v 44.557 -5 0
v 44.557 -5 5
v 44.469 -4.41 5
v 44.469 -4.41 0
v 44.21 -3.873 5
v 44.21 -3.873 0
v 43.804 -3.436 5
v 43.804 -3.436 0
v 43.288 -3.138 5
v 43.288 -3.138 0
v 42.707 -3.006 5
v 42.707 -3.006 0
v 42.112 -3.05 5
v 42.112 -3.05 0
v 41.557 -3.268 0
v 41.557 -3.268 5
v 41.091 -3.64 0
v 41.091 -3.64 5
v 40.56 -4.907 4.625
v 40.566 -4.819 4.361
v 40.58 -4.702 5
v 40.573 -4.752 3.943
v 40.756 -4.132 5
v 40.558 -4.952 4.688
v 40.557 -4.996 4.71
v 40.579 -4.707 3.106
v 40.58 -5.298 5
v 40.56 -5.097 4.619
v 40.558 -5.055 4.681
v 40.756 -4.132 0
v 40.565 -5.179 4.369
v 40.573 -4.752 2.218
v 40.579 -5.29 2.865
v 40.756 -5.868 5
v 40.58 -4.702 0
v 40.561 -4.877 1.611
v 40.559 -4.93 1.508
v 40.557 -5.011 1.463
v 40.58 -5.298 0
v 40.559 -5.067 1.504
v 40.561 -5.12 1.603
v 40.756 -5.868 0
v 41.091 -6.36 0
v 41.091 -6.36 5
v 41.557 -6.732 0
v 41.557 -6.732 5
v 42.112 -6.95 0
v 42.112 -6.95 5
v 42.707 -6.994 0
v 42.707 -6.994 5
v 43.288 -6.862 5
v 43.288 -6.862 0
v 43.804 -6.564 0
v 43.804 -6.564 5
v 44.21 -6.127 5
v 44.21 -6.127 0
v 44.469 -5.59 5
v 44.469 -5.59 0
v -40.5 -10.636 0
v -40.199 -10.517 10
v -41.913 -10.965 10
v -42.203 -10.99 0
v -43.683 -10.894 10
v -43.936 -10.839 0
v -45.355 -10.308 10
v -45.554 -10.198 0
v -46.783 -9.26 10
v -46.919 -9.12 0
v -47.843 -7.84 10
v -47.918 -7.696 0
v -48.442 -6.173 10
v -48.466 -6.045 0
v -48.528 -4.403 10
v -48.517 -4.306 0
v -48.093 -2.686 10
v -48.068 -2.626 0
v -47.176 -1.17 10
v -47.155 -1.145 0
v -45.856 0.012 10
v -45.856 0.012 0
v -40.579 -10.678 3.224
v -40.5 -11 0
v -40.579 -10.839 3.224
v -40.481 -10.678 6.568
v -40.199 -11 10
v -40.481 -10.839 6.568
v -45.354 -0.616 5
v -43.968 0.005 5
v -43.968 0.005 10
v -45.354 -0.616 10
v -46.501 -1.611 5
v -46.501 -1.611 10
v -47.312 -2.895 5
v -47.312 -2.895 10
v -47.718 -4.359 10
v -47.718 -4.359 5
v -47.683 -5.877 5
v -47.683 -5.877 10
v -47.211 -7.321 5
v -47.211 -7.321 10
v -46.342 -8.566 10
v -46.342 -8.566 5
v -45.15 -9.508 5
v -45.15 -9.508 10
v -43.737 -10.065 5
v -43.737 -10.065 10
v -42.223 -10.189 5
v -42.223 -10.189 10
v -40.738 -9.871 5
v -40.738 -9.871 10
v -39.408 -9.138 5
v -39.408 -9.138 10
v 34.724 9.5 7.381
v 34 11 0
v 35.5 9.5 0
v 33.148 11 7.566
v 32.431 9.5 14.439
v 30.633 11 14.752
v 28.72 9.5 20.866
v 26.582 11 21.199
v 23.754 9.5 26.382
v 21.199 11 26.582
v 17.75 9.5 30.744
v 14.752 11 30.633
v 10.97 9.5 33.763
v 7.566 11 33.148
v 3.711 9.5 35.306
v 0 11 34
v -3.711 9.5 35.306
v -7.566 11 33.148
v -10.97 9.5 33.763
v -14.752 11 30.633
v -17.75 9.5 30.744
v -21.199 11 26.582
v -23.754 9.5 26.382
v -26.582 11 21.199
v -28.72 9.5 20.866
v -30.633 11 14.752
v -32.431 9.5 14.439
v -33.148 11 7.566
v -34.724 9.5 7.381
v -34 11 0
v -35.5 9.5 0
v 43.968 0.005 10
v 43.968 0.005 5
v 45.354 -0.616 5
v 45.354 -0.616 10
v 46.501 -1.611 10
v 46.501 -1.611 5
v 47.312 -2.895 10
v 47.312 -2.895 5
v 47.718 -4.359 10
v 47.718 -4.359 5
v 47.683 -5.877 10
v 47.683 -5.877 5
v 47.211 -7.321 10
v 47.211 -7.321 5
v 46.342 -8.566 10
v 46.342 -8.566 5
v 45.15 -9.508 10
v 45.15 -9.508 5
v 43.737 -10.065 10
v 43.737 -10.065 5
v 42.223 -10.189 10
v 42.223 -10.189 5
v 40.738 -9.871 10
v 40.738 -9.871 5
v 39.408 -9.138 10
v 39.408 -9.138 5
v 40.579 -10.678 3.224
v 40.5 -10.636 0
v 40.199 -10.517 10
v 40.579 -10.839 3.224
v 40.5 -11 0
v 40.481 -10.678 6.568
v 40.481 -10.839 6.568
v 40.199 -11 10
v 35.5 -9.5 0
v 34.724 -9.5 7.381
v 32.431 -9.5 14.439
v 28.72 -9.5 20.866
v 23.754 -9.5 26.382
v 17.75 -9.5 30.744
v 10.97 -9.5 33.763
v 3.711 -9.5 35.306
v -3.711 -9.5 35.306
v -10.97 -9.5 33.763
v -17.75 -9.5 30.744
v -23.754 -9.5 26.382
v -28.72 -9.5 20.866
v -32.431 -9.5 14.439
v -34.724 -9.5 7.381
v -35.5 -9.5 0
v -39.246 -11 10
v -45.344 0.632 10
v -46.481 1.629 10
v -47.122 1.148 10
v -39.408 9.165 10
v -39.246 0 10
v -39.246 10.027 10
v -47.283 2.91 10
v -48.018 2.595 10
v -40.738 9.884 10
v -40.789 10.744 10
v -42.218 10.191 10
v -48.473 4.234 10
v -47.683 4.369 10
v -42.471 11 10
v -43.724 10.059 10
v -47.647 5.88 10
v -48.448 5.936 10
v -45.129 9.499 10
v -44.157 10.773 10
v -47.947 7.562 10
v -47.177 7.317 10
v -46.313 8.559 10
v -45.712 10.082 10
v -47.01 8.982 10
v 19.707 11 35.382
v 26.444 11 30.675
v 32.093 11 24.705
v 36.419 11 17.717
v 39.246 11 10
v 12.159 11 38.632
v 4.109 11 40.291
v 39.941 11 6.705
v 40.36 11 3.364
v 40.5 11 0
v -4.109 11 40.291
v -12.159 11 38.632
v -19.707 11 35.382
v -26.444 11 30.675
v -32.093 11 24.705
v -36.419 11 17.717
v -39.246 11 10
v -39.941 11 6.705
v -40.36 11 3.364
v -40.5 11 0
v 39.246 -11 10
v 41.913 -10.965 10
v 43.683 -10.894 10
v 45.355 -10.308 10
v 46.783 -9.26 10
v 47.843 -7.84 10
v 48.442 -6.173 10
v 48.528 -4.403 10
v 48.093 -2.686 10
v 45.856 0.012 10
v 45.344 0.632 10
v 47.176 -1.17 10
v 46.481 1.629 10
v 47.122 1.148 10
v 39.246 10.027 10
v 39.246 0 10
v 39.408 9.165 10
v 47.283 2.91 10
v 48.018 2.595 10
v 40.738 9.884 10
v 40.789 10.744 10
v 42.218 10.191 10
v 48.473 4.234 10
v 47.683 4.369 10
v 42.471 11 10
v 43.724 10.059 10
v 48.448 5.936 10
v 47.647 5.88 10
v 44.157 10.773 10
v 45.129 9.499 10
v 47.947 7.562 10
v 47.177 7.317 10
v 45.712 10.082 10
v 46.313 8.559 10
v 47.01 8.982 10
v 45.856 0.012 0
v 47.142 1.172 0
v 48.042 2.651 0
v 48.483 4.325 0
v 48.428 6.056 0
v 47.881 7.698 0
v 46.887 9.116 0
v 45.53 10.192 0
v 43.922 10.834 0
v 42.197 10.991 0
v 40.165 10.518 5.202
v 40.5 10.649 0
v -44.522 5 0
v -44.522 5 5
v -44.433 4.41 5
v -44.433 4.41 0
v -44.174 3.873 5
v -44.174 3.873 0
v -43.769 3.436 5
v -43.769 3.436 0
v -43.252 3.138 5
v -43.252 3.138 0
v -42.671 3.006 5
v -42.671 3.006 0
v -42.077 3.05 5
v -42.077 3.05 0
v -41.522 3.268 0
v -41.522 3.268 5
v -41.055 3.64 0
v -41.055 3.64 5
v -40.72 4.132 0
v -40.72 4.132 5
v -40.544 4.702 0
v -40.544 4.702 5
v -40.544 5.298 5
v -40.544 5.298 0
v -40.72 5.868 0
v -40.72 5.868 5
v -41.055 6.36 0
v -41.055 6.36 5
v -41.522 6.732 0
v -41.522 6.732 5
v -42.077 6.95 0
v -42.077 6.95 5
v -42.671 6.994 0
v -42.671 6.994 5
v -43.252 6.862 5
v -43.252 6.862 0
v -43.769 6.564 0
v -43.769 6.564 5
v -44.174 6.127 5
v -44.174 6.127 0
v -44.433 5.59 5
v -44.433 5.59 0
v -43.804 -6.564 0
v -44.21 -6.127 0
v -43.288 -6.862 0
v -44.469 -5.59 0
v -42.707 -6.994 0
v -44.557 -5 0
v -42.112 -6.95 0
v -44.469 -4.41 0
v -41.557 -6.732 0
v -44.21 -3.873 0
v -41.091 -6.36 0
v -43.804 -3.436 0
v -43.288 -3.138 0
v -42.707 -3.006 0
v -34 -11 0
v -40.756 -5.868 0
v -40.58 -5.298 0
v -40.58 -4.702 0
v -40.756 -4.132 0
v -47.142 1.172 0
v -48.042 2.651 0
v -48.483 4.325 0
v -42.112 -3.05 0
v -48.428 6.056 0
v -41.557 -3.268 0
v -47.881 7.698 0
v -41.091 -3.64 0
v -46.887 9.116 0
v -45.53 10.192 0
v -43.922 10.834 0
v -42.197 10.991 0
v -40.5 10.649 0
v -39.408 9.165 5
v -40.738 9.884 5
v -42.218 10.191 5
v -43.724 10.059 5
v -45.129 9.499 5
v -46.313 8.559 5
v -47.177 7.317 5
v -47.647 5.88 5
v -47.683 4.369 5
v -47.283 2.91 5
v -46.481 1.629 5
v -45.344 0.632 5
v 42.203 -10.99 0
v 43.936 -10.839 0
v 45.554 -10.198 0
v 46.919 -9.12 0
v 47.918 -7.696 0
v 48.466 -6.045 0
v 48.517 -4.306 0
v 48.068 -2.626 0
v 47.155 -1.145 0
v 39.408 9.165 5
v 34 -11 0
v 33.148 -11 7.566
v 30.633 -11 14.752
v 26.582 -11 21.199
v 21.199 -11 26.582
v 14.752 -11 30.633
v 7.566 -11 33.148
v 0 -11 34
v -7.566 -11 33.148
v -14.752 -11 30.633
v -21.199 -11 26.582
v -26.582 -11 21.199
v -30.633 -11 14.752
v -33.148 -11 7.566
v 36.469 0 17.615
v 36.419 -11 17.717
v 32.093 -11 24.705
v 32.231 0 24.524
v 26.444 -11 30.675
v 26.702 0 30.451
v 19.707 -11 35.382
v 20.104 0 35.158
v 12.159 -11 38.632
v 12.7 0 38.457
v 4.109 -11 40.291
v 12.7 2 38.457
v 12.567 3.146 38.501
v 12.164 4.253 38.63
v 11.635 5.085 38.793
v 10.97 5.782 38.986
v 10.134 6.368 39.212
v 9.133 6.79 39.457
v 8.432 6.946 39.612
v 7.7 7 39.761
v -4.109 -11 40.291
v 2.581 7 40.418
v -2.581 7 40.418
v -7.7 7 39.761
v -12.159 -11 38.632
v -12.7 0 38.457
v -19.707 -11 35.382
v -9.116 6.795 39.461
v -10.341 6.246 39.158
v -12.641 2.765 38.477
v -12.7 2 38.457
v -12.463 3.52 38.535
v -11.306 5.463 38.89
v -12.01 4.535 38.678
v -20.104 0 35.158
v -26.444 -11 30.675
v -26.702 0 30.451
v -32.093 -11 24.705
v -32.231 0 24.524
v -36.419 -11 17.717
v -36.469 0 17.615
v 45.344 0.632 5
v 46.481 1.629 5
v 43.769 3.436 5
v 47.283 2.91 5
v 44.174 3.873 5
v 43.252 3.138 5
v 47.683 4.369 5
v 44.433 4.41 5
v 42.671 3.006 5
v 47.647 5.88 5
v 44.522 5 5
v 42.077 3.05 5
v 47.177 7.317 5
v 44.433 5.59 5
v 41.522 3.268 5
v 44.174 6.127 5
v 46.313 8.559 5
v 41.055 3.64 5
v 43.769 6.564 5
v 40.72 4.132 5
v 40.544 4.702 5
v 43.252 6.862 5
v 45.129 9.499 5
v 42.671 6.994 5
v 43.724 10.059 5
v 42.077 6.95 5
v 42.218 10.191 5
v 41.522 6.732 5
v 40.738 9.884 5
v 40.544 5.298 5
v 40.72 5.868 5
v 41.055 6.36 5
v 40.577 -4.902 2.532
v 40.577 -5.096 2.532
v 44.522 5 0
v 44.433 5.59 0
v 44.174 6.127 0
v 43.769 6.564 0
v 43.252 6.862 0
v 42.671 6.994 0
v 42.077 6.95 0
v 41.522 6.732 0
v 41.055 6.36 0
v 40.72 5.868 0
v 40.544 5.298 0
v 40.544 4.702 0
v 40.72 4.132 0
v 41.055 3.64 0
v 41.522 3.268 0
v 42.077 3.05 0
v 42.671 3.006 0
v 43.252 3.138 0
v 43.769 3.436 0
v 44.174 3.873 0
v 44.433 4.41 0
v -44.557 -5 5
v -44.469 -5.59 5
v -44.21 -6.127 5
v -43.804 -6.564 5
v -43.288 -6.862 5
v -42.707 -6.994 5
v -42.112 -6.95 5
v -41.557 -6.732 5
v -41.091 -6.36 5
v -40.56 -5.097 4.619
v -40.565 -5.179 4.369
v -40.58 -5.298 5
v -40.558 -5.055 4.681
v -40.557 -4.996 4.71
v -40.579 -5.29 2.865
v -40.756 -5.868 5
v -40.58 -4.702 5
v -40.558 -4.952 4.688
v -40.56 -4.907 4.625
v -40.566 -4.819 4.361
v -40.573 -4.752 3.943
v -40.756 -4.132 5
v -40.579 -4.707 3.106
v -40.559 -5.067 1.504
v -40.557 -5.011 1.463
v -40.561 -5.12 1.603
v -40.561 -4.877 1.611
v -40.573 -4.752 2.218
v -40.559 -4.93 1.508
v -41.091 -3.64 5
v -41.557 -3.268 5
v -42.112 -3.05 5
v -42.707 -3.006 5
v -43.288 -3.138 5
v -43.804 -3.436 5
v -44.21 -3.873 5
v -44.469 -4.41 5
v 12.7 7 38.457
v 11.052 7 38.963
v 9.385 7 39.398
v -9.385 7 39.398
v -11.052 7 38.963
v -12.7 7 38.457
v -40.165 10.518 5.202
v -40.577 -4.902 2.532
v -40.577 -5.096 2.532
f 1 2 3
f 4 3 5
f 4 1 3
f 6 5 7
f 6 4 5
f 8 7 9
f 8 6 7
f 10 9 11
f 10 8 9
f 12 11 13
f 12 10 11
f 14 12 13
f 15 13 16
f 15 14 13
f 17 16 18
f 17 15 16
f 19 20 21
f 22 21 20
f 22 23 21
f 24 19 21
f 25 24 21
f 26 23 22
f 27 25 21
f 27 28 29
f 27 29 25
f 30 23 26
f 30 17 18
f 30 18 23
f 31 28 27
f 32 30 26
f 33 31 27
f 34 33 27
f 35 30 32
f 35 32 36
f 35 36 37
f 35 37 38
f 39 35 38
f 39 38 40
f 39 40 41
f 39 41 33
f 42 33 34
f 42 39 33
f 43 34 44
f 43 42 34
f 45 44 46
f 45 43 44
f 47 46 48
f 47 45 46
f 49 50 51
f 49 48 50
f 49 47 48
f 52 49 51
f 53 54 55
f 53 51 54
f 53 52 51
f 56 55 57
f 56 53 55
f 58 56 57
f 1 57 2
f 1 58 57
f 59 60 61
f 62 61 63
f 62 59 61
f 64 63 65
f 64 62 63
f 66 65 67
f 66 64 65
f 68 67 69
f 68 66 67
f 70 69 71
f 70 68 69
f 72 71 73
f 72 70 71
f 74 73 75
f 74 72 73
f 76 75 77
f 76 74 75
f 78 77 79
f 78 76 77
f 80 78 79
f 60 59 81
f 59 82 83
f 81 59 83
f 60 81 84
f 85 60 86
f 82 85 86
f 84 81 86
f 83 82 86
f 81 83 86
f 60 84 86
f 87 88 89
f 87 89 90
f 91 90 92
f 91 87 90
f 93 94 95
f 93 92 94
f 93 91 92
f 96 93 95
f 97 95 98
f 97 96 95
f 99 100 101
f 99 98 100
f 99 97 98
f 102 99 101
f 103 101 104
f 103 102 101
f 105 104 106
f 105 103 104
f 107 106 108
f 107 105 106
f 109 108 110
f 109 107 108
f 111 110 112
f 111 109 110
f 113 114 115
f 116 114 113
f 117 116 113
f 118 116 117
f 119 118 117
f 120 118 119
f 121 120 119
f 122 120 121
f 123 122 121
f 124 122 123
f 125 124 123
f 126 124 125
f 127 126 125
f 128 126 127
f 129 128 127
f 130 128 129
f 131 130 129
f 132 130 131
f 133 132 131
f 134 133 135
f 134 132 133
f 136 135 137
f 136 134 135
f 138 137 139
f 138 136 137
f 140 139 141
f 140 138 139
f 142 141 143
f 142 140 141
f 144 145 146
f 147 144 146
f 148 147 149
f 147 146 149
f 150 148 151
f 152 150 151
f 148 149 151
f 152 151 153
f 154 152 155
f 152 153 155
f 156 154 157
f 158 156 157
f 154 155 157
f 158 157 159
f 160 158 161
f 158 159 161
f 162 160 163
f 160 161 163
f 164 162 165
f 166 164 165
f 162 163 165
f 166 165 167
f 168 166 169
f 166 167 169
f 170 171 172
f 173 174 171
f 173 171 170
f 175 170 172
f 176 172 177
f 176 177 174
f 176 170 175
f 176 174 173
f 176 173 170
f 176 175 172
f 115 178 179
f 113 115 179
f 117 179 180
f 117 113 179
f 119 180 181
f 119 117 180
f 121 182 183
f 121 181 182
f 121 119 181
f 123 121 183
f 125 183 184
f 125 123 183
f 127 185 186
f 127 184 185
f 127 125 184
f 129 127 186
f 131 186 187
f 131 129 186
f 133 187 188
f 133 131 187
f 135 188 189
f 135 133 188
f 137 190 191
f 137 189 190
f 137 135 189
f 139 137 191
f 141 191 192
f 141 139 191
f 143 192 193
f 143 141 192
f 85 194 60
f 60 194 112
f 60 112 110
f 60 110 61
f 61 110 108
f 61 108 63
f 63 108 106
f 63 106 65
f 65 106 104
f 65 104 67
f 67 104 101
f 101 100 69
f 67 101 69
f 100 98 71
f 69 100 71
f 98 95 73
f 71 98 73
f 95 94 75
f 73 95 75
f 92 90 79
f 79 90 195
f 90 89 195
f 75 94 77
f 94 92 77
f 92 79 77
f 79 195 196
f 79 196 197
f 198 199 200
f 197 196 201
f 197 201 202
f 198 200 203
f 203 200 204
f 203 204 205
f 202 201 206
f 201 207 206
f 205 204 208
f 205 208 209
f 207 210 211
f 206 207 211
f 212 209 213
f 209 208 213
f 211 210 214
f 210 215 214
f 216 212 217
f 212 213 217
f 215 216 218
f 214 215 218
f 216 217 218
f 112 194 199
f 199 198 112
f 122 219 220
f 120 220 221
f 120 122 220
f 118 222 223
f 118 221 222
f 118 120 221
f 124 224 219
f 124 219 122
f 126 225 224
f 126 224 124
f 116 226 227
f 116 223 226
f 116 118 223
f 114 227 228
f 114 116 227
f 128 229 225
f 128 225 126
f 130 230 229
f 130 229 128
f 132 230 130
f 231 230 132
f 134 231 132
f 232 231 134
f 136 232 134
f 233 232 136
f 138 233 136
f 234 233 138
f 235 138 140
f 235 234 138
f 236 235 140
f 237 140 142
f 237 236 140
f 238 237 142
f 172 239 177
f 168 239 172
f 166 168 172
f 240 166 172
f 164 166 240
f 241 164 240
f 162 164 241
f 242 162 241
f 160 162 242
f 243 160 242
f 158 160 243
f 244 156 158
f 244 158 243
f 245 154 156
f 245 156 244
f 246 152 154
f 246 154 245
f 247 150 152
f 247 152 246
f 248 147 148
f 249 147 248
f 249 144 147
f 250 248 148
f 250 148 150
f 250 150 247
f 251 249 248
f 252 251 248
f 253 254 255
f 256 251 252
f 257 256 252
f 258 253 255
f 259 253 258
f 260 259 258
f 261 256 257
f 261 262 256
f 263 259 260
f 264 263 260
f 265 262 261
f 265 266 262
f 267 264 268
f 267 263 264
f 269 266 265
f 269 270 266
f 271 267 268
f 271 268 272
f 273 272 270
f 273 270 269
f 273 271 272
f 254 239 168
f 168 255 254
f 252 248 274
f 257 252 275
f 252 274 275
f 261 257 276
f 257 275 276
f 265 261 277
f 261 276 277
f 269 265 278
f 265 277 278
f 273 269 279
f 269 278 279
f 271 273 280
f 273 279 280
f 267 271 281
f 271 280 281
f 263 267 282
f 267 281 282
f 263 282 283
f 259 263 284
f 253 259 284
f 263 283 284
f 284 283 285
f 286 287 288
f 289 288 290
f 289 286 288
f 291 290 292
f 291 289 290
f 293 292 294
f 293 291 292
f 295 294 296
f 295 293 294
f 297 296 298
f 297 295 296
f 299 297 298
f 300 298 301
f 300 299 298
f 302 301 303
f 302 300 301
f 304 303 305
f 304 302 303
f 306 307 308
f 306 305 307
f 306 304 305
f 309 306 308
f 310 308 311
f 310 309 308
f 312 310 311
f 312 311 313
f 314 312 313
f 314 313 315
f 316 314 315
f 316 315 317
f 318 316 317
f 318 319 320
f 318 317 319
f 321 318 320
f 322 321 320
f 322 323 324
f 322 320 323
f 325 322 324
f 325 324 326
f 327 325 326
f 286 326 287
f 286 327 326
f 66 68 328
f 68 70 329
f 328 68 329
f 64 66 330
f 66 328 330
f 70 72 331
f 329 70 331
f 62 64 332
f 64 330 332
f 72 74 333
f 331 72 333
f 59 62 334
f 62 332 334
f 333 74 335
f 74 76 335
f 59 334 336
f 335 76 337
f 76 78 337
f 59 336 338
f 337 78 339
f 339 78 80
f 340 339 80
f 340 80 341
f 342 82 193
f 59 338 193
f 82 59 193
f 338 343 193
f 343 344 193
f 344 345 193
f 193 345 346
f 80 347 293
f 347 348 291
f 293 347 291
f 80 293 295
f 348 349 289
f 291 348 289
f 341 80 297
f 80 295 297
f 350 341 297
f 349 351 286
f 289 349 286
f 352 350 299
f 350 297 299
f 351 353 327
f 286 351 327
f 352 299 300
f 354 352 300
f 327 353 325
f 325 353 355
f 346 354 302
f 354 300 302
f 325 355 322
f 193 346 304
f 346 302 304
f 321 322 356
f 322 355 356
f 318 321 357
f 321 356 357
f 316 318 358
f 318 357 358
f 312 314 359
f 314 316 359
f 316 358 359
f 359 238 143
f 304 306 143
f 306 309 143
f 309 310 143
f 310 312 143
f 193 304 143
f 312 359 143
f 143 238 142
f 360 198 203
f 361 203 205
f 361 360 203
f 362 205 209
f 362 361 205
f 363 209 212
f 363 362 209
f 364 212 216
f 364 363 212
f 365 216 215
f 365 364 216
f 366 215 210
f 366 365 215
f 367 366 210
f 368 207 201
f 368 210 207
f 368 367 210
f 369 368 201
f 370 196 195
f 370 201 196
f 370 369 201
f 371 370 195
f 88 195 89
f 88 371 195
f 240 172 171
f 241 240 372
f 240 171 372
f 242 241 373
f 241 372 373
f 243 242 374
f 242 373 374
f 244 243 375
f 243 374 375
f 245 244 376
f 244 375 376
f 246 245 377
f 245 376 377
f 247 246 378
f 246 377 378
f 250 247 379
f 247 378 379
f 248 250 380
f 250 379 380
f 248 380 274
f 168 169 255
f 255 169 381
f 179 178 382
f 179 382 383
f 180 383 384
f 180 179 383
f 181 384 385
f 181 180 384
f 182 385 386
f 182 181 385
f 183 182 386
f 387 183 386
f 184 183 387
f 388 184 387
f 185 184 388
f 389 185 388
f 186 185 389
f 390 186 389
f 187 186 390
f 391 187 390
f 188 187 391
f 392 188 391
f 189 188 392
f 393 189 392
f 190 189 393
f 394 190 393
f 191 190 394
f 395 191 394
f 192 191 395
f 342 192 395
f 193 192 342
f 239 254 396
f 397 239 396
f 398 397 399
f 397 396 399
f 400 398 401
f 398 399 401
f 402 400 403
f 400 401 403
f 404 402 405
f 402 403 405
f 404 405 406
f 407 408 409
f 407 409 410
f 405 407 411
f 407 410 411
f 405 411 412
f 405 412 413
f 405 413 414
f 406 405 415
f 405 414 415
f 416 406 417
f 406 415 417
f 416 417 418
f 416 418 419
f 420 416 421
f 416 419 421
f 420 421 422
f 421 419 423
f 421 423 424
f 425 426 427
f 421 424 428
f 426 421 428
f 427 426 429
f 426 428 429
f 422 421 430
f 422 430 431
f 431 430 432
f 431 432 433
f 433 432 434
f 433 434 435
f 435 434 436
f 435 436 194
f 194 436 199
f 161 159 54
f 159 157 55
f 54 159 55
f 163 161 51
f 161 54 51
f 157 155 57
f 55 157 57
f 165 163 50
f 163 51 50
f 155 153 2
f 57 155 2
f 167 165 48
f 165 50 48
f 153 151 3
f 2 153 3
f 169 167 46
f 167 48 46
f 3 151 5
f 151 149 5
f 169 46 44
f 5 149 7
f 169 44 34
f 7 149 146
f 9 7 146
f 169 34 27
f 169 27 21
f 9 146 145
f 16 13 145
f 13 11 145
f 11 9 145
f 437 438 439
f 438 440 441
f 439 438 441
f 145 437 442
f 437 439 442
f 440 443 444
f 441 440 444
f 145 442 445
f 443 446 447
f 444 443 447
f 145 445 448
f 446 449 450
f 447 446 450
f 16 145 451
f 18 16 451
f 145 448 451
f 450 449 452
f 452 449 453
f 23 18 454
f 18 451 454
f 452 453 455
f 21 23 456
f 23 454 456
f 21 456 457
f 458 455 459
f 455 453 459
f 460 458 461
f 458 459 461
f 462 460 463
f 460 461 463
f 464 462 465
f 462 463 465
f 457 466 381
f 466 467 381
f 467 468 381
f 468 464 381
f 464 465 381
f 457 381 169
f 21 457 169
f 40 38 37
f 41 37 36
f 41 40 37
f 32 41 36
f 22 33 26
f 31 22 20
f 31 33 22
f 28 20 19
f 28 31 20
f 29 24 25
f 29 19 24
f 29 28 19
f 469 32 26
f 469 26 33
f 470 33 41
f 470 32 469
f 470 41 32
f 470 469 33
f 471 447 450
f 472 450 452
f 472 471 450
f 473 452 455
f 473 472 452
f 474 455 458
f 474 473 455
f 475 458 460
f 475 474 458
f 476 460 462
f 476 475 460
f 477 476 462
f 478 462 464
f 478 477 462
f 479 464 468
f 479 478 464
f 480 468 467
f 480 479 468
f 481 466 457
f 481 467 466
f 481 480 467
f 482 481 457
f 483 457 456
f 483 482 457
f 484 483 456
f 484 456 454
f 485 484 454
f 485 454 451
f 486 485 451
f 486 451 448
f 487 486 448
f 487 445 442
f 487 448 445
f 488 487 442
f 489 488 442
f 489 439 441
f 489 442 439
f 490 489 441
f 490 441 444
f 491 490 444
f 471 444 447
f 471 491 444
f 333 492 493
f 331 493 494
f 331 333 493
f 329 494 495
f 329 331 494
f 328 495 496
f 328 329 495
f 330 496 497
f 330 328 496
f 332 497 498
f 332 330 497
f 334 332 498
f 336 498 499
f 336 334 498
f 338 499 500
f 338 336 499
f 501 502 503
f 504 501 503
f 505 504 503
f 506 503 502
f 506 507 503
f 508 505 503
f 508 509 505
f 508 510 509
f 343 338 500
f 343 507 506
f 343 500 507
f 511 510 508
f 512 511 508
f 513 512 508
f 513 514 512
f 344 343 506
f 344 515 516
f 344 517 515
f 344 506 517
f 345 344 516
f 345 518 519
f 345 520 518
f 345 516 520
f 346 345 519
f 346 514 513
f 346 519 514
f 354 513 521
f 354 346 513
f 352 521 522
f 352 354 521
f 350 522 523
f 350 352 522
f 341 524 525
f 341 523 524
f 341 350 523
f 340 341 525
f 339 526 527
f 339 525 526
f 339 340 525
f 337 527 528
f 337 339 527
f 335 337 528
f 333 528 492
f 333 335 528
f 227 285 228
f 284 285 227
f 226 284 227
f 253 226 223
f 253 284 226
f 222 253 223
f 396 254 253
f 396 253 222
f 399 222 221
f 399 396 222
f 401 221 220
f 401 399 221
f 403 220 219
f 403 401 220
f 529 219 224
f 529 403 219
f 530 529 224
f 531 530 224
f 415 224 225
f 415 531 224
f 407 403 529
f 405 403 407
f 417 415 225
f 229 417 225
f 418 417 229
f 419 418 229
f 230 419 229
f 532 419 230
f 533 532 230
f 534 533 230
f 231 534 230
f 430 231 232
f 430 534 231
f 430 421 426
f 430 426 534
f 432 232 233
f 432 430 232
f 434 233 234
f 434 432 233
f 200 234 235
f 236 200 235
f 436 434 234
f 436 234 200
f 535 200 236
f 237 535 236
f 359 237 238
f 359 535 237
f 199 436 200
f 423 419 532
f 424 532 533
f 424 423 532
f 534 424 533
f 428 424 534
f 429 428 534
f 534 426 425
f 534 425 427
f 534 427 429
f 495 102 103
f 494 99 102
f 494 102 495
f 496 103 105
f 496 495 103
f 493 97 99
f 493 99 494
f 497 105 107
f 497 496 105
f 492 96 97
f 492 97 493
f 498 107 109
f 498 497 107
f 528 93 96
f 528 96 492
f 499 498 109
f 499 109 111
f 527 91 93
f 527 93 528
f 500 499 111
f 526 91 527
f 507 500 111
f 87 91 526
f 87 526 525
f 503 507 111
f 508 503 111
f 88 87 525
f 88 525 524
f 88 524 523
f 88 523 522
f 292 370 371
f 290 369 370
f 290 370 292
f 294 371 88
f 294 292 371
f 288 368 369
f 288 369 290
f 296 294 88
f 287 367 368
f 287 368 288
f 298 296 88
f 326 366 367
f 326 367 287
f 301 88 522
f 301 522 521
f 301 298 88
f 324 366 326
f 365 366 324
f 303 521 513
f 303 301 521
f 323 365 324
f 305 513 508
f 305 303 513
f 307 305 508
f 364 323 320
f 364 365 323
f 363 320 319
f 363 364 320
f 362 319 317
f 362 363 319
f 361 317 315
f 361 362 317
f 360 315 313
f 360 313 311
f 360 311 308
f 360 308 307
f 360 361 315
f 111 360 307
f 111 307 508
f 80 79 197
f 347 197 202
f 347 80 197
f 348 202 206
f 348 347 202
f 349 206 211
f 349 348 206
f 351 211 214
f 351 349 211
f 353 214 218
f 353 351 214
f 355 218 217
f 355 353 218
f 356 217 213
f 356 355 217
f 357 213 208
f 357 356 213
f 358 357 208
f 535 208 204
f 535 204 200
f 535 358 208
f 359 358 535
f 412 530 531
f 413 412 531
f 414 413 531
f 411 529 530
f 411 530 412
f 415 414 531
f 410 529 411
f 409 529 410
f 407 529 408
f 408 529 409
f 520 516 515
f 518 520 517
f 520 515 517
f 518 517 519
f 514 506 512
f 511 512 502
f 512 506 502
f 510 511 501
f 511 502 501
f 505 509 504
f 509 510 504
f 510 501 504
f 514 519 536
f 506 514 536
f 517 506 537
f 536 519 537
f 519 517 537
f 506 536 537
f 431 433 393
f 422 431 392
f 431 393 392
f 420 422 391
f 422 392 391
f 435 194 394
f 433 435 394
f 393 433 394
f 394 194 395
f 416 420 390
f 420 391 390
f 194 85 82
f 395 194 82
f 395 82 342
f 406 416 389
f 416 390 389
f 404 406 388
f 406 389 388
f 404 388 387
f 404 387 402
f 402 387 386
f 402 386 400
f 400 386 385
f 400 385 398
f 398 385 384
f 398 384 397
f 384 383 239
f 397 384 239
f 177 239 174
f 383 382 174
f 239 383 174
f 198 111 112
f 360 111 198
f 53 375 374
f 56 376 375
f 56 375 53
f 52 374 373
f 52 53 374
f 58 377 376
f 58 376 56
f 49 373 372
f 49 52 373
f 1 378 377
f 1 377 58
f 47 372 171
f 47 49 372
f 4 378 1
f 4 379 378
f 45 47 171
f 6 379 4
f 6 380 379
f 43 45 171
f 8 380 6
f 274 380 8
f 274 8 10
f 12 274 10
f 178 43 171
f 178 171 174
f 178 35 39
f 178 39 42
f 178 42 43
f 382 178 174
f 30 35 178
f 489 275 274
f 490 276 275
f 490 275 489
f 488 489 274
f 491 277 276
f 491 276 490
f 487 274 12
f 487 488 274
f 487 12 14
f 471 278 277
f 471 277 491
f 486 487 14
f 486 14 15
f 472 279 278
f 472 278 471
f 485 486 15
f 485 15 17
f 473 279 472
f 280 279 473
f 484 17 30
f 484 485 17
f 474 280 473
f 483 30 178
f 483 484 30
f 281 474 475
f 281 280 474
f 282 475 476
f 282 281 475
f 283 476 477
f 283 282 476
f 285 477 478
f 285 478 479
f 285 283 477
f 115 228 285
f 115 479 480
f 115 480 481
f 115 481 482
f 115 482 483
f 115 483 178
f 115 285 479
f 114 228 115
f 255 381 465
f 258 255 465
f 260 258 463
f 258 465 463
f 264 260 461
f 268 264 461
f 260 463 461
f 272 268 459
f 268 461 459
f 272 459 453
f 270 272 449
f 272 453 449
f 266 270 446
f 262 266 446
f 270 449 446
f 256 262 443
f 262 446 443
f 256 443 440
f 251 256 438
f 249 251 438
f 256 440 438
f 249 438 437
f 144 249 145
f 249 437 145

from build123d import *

# Parameters (mm, degrees)
REVOLVE1_ANGLE                  = 180
BOSS_EXTRUDE1_START             = -11
BOSS_EXTRUDE1_DEPTH             = 11
CUT_EXTRUDE1_REACH              = 68.374
BOSS_EXTRUDE2_REACH             = 67.327
BOSS_EXTRUDE2_END_RADIUS        = 40.5
SKETCH6_W                       = 25.4
SKETCH6_H                       = 18
BOSS_EXTRUDE2_DIRECTION_2_DEPTH = 15
SKETCH8_W                       = 4
SKETCH8_H                       = 19.884534
CUT_EXTRUDE3_DEPTH              = 80.722348
FILLET1_START                   = 2
FILLET1_DEPTH                   = 5
FILLET1_START_2                 = -11
FILLET1_2_DEPTH                 = 16.09884
FILLET1_START_3                 = 37
FILLET1_3_DEPTH                 = 28
FILLET1_START_4                 = 62
FILLET1_4_OUTLINE_W             = 4
FILLET1_4_OUTLINE_H             = 5
FILLET1_4_DEPTH                 = 3
FILLET1_START_5                 = 39.17071
FILLET1_5_OUTLINE_W             = 4
FILLET1_5_OUTLINE_H             = 5
FILLET1_5_DEPTH                 = 2.944756
FILLET1_6_DEPTH                 = 6
SKETCH9_R                       = 2
BOSS_EXTRUDE3_DEPTH             = 10
CUT_EXTRUDE4_DEPTH              = 75.187772
CUT_EXTRUDE4_DEPTH_BACK         = 5
CUT_EXTRUDE5_DEPTH              = 85.064413


with BuildPart() as part:
    # Sketch2 → Revolve1 (revolve, symmetric)
    with BuildSketch(Plane(origin=(0, 0, 0), x_dir=(0, 0, -1), z_dir=(1, 0, 0))) as revolve1_sk:
        Polygon((-34, -11), (-35.5, -9.5), (-35.5, 9.5), (-34, 11), (-35.5, 11), (-40.5, 11), (-40.5, -11), (-35.5, -11), align=None)
    revolve(axis=Axis((0, 0, 0), (0, 1, 0)), revolution_arc=REVOLVE1_ANGLE / 2)
    revolve(revolve1_sk.sketch, axis=Axis((0, 0, 0), (0, -1, 0)), revolution_arc=REVOLVE1_ANGLE / 2)

    # Sketch3 → Boss-Extrude1 (add)
    with BuildSketch(Plane(origin=(0, 0, 0), x_dir=(1, 0, 0), z_dir=(0, 1, 0)).offset(BOSS_EXTRUDE1_START)):
        with BuildLine():
            ThreePointArc((-40.5, 0), (0, -40.5), (40.5, 0))
            add(Edge.make_bspline(
                [(40.5, 0), (41.574904, -20.679763), (31.861074, -51.110818), (0, -51.360442)],
                knots=[0, 0, 0, 0, 1, 1, 1, 1], degree=3))
            add(Edge.make_bspline(
                [(-40.5, 0), (-41.574904, -20.679763), (-31.861074, -51.110818), (0, -51.360442)],
                knots=[0, 0, 0, 0, 1, 1, 1, 1], degree=3))
        make_face()
    extrude(amount=BOSS_EXTRUDE1_DEPTH)

    # Sketch5 → Cut-Extrude1 (cut, up to next)
    with BuildSketch(Plane(origin=(0, 0, 0), x_dir=(1, 0, 0), z_dir=(0, 1, 0)), mode=Mode.PRIVATE) as cut_extrude1_sk1:
        Polygon((32.298595, -50), (-32.298595, -50), (-4.520904, -70.798059), align=None)
    cut_extrude1_tool1 = extrude(cut_extrude1_sk1.sketch, amount=-CUT_EXTRUDE1_REACH, mode=Mode.PRIVATE) & part.part
    add(cut_extrude1_tool1.solids().sort_by_distance((-1.506968, 0, 56.932686))[0], mode=Mode.SUBTRACT)

    # Boss-Extrude2: up to this cylinder (the profile starts outside it)
    boss_extrude2_end = Plane(origin=(0, -2, 0), z_dir=(0, -1, 0)) * Cylinder(BOSS_EXTRUDE2_END_RADIUS, 216.654, mode=Mode.PRIVATE)
    # Sketch6 → Boss-Extrude2 (add, up to the surface)
    with BuildSketch(Plane.XY.offset(50), mode=Mode.PRIVATE) as boss_extrude2_sk1:
        with Locations((0, -2)):
            Rectangle(SKETCH6_W, SKETCH6_H)
    boss_extrude2_tool1 = extrude(boss_extrude2_sk1.sketch, amount=-BOSS_EXTRUDE2_REACH, mode=Mode.PRIVATE) - boss_extrude2_end
    add(boss_extrude2_tool1.solids().sort_by_distance((0, -2, 50))[0])

    # Sketch6 → Boss-Extrude2 direction 2 (add)
    with BuildSketch(Plane.XY.offset(50)):
        with Locations((0, -2)):
            Rectangle(SKETCH6_W, SKETCH6_H)
    extrude(amount=BOSS_EXTRUDE2_DIRECTION_2_DEPTH)

    # Sketch8 → Cut-Extrude3 (cut, through all)
    with BuildSketch(Plane(origin=(0, 11, 0), x_dir=(1, 0, 0), z_dir=(0, 1, 0))):
        with BuildLine():
            Line((15.113165, -40.129156), (15.113165, -45.006528))
            add(Edge.make_bspline(
                [(15.113165, -45.006528), (20.553217, -43.096096), (30.745136, -32.716473), (33.442003, -26.840069)],
                knots=[0, 0, 0, 0, 1, 1, 1, 1], degree=3))
            ThreePointArc((33.442003, -26.840069), (25.17044, -34.716075), (15.113165, -40.129156))
        make_face()
        with BuildLine():
            Line((-15.113165, -40.129156), (-15.113165, -45.006528))
            add(Edge.make_bspline(
                [(-15.113165, -45.006528), (-20.553217, -43.096096), (-30.745136, -32.716473), (-33.442003, -26.840069)],
                knots=[0, 0, 0, 0, 1, 1, 1, 1], degree=3))
            ThreePointArc((-33.442003, -26.840069), (-25.17044, -34.716075), (-15.113165, -40.129156))
        make_face()
        with Locations((0, -52.057733)):
            Rectangle(SKETCH8_W, SKETCH8_H)
    extrude(amount=-CUT_EXTRUDE3_DEPTH, mode=Mode.SUBTRACT)

    # Fillet1: read off the stored shape, not the designer's step
    # Fillet1 outline → Fillet1 (cut)
    with BuildSketch(Plane(origin=(0, 0, 0), x_dir=(1, 0, 0), z_dir=(0, 1, 0)).offset(FILLET1_START)):
        with BuildLine():
            Line((-12.7, -65), (12.7, -65))
            Line((12.7, -65), (12.7, -38.457249))
            ThreePointArc((12.7, -38.457249), (0, -40.5), (-12.7, -38.457249))
            Line((-12.7, -38.457249), (-12.7, -65))
        make_face()
    extrude(amount=FILLET1_DEPTH, mode=Mode.SUBTRACT)

    # Fillet1 2 outline → Fillet1 2 (cut)
    with BuildSketch(Plane(origin=(0, 0, 0), x_dir=(1, 0, 0), z_dir=(0, 1, 0)).offset(FILLET1_START_2)):
        with BuildLine():
            Line((-12.7, -65), (-7.7, -65))
            add(Edge.make_bspline(
                [(-7.7, -65), (-12.7, -65), (-12.7, -60)],
                knots=[0, 0, 0, 1, 1, 1], degree=2, weights=[1, 0.707107, 1]))
            Line((-12.7, -60), (-12.7, -65))
        make_face()
        with BuildLine():
            add(Edge.make_bspline(
                [(7.7, -65), (12.7, -65), (12.7, -60)],
                knots=[0, 0, 0, 1, 1, 1], degree=2, weights=[1, 0.707107, 1]))
            Line((7.7, -65), (12.7, -65))
            Line((12.7, -65), (12.7, -60))
        make_face()
    extrude(amount=FILLET1_2_DEPTH, mode=Mode.SUBTRACT)

    # Fillet1 3 outline → Fillet1 3 (add)
    with BuildSketch(Plane.XY.offset(FILLET1_START_3)):
        with BuildLine():
            add(Edge.make_bspline(
                [(-12.7, 2), (-12.7, 7), (-7.7, 7)],
                knots=[0, 0, 0, 1, 1, 1], degree=2, weights=[1, 0.707107, 1]))
            Line((-12.7, 2), (-2, 2))
            Line((-2, 2), (-2, 7))
            Line((-2, 7), (-7.7, 7))
        make_face()
        with BuildLine():
            Line((2, 7), (2, 2))
            Line((2, 2), (12.7, 2))
            add(Edge.make_bspline(
                [(7.7, 7), (12.7, 7), (12.7, 2)],
                knots=[0, 0, 0, 1, 1, 1], degree=2, weights=[1, 0.707107, 1]))
            Line((7.7, 7), (2, 7))
        make_face()
    extrude(amount=FILLET1_3_DEPTH)

    # Fillet1 4 outline → Fillet1 4 (add)
    with BuildSketch(Plane.XY.offset(FILLET1_START_4)):
        with Locations((0, 4.5)):
            Rectangle(FILLET1_4_OUTLINE_W, FILLET1_4_OUTLINE_H)
    extrude(amount=FILLET1_4_DEPTH)

    # Fillet1 5 outline → Fillet1 5 (add)
    with BuildSketch(Plane.XY.offset(FILLET1_START_5)):
        with Locations((0, 4.5)):
            Rectangle(FILLET1_5_OUTLINE_W, FILLET1_5_OUTLINE_H)
    extrude(amount=FILLET1_5_DEPTH)

    # Fillet1 6 outline → Fillet1 6 (cut)
    with BuildSketch(Plane(origin=(0, 0, 0), x_dir=(1, 0, 0), z_dir=(0, 1, 0)).offset(FILLET1_START)):
        with BuildLine():
            Line((-12.7, -65), (-7.7, -65))
            add(Edge.make_bspline(
                [(-12.7, -60), (-12.7, -60.274102), (-12.679965, -60.548369), (-12.639842, -60.820553), (-12.536378, -61.284433), (-12.482162, -61.478121), (-12.41762, -61.668662), (-12.288664, -61.991396), (-12.22893, -62.125441), (-12.163988, -62.25706), (-11.922281, -62.702191), (-11.720174, -63.002028), (-11.490067, -63.281001), (-10.981001, -63.790067), (-10.702028, -64.020174), (-10.402191, -64.222281), (-9.95706, -64.463988), (-9.825441, -64.52893), (-9.691396, -64.588664), (-9.368662, -64.71762), (-9.178121, -64.782162), (-8.984433, -64.836378), (-8.520553, -64.939842), (-8.248369, -64.979965), (-7.974102, -65), (-7.7, -65)],
                knots=[0, 0, 0, 0, 0, 0.139857, 0.139857, 0.139857, 0.242164, 0.242164, 0.242164, 0.316823, 0.316823, 0.316823, 0.5, 0.5, 0.5, 0.683177, 0.683177, 0.683177, 0.757836, 0.757836, 0.757836, 0.860143, 0.860143, 0.860143, 1, 1, 1, 1, 1], degree=4))
            Line((-12.7, -60), (-12.7, -65))
        make_face()
        with BuildLine():
            Line((12.7, -65), (12.7, -60))
            add(Edge.make_bspline(
                [(12.7, -60), (12.7, -60.274102), (12.679965, -60.548369), (12.639842, -60.820553), (12.536378, -61.284433), (12.482162, -61.478121), (12.41762, -61.668662), (12.288664, -61.991396), (12.22893, -62.125441), (12.163988, -62.25706), (11.922281, -62.702191), (11.720174, -63.002028), (11.490067, -63.281001), (10.981001, -63.790067), (10.702028, -64.020174), (10.402191, -64.222281), (9.95706, -64.463988), (9.825441, -64.52893), (9.691396, -64.588664), (9.368662, -64.71762), (9.178121, -64.782162), (8.984433, -64.836378), (8.520553, -64.939842), (8.248369, -64.979965), (7.974102, -65), (7.7, -65)],
                knots=[0, 0, 0, 0, 0, 0.139857, 0.139857, 0.139857, 0.242164, 0.242164, 0.242164, 0.316823, 0.316823, 0.316823, 0.5, 0.5, 0.5, 0.683177, 0.683177, 0.683177, 0.757836, 0.757836, 0.757836, 0.860143, 0.860143, 0.860143, 1, 1, 1, 1, 1], degree=4))
            Line((7.7, -65), (12.7, -65))
        make_face()
    extrude(amount=FILLET1_6_DEPTH, mode=Mode.SUBTRACT)

    # Sketch9 → Boss-Extrude3 (add)
    # profile 1 of 2: a face of its own
    with BuildSketch(Plane.XY):
        with BuildLine():
            ThreePointArc((39.222943, -0.011905), (42.578982, -10.999961), (45.856052, 0.011905))
            ThreePointArc((45.856052, 0.011905), (42.500013, 10.999961), (39.222943, -0.011905))
        make_face()
        with Locations((42.557445, -5)):
            Circle(SKETCH9_R, mode=Mode.SUBTRACT)
        with Locations((42.52155, 5)):
            Circle(SKETCH9_R, mode=Mode.SUBTRACT)
    # profile 2 of 2: a face of its own
    with BuildSketch(Plane.XY):
        with BuildLine():
            ThreePointArc((-39.222943, -0.011905), (-42.578982, -10.999961), (-45.856052, 0.011905))
            ThreePointArc((-45.856052, 0.011905), (-42.500013, 10.999961), (-39.222943, -0.011905))
        make_face()
        with Locations(Location((-42.557445, -5, 0), (0, 0, 180))):
            Circle(SKETCH9_R, mode=Mode.SUBTRACT)
        with Locations(Location((-42.52155, 5, 0), (0, 0, 180))):
            Circle(SKETCH9_R, mode=Mode.SUBTRACT)
    extrude(amount=BOSS_EXTRUDE3_DEPTH)

    # Sketch10 → Cut-Extrude4 (cut, two sides: drawn at the far end of the back side and taken through both)
    with BuildSketch(Plane.XY.offset(10).offset(-CUT_EXTRUDE4_DEPTH_BACK)):
        with BuildLine():
            Line((39.407769, -9.137577), (39.407769, 9.164657))
            ThreePointArc((39.407769, 9.164657), (47.176604, 7.317427), (43.967661, 0.005126))
            ThreePointArc((43.967661, 0.005126), (47.210797, -7.320844), (39.407769, -9.137577))
        make_face()
        with BuildLine():
            Line((-39.407769, -9.137577), (-39.407769, 9.164657))
            ThreePointArc((-39.407769, 9.164657), (-47.176604, 7.317427), (-43.967661, 0.005126))
            ThreePointArc((-43.967661, 0.005126), (-47.210797, -7.320844), (-39.407769, -9.137577))
        make_face()
    extrude(amount=CUT_EXTRUDE4_DEPTH + CUT_EXTRUDE4_DEPTH_BACK, mode=Mode.SUBTRACT)

    # Sketch11 → Cut-Extrude5 (cut, through all)
    with BuildSketch(Plane(origin=(0, 11, 0), x_dir=(1, 0, 0), z_dir=(0, 1, 0))):
        with BuildLine():
            Line((48.52155, -10), (39.246019, -10))
            ThreePointArc((39.246019, -10), (0, -40.5), (-39.246019, -10))
            Line((-39.246019, -10), (-48.52155, -10))
            Line((-48.52155, -10), (-48.52155, -69.748878))
            Line((-48.52155, -69.748878), (48.52155, -69.748878))
            Line((48.52155, -69.748878), (48.52155, -10))
        make_face()
    extrude(amount=-CUT_EXTRUDE5_DEPTH, mode=Mode.SUBTRACT)


solid = part.part
